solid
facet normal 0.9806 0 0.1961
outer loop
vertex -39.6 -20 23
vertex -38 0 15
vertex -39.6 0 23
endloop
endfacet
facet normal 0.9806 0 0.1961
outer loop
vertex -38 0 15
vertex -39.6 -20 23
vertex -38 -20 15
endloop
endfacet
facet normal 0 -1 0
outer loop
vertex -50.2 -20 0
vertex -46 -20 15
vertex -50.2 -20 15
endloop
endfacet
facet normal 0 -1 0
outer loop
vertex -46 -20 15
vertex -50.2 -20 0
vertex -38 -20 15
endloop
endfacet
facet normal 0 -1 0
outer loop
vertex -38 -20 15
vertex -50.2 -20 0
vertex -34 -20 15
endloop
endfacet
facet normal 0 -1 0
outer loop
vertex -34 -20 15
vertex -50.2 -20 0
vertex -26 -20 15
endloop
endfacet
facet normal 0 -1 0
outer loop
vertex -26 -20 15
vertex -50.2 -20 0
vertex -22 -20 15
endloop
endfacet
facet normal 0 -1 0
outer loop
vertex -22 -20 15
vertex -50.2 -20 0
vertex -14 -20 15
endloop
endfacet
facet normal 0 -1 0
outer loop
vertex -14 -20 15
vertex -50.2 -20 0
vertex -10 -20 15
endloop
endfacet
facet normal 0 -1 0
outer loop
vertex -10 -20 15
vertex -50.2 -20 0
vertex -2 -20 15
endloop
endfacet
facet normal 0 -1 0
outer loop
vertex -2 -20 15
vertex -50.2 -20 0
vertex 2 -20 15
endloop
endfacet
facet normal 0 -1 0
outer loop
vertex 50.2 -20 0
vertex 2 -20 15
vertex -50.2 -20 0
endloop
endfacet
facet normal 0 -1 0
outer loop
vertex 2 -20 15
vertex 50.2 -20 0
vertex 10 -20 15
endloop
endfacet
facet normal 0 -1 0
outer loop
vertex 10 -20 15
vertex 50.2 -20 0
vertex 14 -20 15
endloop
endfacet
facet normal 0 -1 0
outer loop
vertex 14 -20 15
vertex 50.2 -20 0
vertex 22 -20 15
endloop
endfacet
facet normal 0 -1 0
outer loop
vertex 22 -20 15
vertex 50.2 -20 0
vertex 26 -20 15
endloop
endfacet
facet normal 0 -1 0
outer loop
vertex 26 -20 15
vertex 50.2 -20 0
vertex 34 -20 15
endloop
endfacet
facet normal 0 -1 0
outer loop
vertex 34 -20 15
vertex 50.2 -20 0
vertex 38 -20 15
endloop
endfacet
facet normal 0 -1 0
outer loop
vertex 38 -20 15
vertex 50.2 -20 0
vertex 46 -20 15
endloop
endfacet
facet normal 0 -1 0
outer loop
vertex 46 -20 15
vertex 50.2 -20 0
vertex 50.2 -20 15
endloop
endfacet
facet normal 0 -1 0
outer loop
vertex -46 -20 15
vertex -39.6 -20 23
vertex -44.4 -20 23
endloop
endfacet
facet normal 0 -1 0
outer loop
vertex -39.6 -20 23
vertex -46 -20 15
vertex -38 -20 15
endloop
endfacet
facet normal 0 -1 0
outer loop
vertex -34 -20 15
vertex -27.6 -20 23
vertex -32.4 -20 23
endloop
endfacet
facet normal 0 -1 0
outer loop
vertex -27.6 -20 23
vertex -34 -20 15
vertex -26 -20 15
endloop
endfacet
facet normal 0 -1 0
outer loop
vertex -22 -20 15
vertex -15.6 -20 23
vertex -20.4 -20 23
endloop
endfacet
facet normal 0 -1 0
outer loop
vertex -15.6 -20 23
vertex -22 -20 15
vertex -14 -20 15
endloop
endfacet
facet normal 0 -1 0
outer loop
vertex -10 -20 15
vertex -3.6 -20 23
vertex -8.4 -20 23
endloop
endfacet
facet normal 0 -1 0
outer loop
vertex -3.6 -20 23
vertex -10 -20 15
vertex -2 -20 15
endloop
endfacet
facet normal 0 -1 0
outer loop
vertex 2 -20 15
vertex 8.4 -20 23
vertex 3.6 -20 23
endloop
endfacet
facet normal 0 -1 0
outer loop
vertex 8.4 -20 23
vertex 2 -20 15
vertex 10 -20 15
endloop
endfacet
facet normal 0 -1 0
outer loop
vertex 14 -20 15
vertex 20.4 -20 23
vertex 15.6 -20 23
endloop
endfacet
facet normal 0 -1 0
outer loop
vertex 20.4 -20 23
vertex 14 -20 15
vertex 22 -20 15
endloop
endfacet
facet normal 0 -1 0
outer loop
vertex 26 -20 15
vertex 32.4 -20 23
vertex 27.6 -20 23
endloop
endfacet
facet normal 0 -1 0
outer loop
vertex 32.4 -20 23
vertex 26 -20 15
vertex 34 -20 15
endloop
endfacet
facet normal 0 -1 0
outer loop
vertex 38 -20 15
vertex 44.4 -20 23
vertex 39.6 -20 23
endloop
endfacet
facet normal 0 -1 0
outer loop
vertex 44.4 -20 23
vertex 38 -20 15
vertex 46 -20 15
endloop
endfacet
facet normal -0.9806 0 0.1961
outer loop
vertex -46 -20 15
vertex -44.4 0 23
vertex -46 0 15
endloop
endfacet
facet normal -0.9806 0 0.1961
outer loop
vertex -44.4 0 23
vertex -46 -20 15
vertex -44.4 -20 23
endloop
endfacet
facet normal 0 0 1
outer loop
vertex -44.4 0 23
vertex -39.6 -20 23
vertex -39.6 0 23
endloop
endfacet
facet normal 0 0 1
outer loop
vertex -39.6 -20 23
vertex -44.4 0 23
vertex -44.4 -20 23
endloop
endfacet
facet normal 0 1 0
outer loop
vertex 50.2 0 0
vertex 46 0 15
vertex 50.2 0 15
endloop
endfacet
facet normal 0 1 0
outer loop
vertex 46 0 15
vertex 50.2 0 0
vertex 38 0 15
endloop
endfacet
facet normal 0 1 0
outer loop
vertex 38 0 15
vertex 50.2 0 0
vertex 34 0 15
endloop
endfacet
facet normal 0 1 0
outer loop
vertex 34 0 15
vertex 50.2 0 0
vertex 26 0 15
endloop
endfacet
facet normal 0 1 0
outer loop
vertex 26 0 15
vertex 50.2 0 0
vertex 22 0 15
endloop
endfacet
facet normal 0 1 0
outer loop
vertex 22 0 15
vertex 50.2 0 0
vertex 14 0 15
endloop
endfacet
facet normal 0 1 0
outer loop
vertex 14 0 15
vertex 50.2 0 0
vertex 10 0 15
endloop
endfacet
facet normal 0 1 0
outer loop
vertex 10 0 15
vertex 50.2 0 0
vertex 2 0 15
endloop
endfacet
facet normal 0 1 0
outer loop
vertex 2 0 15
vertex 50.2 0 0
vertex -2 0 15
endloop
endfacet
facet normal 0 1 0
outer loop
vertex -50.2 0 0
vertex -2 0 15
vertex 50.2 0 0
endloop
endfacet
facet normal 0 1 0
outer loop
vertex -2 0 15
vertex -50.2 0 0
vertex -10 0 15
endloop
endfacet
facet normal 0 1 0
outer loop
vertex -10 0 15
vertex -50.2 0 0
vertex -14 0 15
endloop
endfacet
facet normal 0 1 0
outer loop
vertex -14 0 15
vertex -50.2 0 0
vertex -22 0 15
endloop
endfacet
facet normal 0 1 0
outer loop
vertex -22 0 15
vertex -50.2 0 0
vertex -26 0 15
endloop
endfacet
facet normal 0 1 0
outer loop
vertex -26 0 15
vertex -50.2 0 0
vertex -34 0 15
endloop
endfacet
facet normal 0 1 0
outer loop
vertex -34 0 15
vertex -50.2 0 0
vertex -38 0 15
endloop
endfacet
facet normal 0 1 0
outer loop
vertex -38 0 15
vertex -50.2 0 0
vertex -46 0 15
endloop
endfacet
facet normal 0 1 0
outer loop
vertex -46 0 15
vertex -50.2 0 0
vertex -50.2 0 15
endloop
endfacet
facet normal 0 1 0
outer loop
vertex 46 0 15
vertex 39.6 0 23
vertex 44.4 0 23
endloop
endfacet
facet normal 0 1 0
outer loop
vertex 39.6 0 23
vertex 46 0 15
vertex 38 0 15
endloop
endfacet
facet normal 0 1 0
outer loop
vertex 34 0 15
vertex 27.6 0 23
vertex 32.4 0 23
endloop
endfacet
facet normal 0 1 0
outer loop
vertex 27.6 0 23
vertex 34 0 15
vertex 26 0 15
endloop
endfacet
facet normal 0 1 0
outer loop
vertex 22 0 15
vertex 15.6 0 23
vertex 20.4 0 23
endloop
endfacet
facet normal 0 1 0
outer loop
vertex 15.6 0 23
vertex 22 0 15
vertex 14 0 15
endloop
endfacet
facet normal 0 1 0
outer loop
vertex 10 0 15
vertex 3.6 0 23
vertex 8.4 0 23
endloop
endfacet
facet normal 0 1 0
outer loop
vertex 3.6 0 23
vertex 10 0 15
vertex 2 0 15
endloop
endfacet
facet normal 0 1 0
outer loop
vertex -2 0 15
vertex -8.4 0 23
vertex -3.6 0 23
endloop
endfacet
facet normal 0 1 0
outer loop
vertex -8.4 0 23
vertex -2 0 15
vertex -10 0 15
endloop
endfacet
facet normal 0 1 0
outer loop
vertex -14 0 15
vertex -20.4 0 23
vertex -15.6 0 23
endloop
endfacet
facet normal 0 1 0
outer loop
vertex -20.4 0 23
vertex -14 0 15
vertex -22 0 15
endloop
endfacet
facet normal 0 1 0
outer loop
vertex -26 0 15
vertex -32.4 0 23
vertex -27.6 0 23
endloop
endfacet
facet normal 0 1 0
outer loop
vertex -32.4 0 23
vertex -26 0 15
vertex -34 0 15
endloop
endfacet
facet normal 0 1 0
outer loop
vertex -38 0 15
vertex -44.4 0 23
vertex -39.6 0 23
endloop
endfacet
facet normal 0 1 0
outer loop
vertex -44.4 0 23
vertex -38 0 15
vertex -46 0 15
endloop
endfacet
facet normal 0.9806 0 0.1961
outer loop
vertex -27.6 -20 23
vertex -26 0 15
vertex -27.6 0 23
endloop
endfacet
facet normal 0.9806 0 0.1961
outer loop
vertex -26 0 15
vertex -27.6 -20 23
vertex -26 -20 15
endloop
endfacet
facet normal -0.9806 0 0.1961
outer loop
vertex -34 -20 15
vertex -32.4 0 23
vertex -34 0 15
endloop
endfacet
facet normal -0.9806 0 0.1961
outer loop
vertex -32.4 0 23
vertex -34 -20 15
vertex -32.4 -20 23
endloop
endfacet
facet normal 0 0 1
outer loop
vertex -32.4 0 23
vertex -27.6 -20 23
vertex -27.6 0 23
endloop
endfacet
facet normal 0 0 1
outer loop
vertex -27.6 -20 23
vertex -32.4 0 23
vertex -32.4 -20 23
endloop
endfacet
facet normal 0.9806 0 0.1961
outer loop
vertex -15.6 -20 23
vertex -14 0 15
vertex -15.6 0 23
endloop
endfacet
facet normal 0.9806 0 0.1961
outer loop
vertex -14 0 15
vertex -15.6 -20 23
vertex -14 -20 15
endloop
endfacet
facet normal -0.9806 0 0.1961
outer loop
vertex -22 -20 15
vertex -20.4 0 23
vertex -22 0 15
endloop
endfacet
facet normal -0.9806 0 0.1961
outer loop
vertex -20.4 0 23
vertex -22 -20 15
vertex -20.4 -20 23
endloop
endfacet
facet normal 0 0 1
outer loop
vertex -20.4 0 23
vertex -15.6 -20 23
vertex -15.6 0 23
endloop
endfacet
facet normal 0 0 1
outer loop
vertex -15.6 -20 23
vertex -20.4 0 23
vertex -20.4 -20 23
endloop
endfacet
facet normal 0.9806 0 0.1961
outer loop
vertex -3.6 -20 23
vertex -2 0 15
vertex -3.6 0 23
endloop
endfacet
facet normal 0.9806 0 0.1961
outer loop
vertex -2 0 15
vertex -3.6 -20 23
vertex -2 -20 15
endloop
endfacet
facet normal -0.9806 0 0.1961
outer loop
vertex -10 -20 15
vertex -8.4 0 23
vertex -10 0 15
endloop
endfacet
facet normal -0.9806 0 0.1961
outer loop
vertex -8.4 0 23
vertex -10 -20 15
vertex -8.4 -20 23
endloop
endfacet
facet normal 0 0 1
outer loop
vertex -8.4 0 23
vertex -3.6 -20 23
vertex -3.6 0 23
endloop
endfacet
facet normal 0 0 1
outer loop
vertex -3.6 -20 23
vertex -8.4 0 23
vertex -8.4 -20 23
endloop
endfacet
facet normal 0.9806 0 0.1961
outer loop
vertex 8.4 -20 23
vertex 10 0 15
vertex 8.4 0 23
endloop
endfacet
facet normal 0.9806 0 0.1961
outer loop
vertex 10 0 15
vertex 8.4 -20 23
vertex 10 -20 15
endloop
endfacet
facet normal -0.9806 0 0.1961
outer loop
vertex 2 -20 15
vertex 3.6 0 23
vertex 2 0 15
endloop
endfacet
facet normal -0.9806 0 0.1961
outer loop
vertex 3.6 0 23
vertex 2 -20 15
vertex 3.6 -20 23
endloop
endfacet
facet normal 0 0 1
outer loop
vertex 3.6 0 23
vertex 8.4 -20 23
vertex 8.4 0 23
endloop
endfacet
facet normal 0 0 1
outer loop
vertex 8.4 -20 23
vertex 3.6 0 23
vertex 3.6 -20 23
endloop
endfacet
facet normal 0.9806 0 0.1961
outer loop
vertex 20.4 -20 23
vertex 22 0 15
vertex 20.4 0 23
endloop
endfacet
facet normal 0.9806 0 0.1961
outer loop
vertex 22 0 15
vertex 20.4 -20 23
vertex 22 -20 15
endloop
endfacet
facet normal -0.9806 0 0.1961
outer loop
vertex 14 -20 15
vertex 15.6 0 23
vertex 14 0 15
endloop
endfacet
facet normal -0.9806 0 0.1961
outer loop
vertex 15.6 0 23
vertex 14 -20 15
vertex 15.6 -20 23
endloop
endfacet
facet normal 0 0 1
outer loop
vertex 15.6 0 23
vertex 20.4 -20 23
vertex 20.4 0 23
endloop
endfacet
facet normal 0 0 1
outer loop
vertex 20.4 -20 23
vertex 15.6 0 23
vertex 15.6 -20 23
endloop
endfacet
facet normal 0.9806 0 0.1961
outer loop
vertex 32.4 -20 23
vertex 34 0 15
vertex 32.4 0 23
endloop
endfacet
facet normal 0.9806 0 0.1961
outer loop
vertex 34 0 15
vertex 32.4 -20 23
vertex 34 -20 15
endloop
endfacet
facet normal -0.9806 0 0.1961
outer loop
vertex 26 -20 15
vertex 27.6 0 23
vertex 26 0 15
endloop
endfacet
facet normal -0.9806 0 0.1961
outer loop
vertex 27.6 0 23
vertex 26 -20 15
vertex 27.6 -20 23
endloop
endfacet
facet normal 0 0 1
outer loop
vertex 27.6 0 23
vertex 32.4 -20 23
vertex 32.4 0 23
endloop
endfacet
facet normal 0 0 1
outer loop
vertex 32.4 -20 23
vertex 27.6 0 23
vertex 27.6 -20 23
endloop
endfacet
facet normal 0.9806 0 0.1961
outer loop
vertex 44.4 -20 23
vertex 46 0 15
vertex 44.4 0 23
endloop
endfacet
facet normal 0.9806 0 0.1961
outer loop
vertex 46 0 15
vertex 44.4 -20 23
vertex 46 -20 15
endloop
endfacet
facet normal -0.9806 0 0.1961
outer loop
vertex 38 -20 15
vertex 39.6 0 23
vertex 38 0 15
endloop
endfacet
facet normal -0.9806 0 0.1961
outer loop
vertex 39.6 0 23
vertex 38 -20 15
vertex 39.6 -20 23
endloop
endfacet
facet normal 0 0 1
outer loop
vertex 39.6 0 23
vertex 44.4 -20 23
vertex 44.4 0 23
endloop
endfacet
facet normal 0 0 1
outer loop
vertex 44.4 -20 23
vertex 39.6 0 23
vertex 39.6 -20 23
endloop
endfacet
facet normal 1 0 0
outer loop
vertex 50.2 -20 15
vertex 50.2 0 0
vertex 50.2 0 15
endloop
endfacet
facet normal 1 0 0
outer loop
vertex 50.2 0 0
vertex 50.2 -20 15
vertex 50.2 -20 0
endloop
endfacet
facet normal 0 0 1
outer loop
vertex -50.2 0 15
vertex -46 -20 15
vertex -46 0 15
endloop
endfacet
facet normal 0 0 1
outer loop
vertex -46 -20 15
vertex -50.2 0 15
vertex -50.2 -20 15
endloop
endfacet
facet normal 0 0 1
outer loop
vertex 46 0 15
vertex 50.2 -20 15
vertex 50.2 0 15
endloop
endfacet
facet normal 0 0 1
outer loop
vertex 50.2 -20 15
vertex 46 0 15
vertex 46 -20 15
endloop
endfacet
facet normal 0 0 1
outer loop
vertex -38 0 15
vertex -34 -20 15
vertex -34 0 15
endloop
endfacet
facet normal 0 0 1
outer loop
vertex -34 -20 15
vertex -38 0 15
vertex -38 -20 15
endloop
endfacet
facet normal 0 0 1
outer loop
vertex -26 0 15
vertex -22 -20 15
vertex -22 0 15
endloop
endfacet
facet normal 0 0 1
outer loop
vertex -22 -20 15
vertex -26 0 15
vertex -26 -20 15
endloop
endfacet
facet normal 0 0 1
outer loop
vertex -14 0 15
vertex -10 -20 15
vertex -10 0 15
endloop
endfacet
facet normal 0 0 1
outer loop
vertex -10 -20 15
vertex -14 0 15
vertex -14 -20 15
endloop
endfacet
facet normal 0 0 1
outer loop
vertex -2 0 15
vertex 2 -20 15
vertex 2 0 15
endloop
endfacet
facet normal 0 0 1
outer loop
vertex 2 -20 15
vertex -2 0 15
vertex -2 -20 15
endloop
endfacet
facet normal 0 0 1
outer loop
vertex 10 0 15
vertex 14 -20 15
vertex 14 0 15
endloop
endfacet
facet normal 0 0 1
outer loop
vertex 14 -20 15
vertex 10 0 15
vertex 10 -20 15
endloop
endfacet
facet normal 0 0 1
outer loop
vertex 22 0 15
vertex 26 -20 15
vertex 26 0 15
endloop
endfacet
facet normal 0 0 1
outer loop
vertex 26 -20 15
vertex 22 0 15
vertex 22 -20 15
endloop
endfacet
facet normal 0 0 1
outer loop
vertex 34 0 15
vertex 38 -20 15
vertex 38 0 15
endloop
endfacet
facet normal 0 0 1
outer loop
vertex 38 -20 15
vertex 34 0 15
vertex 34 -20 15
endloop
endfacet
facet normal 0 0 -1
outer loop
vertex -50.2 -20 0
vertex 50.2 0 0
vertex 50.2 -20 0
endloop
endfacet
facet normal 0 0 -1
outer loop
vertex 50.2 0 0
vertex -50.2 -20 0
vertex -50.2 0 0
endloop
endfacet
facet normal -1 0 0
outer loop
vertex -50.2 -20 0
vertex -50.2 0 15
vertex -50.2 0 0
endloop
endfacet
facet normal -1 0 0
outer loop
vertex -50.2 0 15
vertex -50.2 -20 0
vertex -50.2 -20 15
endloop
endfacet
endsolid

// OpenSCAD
$fn = 32;

// ----------------------------------------------------------------------
// Toothed rack, 8 teeth
// 12 mm pitch, 8 mm teeth
// ----------------------------------------------------------------------

// --- parameters (mm) ---
bar_w = 20;     // bar width (Y)
bar_h = 15;     // bar height (Z)
teeth = 8;      // number of teeth
pitch = 12;     // tooth pitch
tooth_h = 8;    // tooth height above the bar
root_w = 8.4;   // tooth width at the root
crest_w = 4.8;  // tooth width at the crest

// --- derived feature positions (mm) ---
span = (teeth - 1) * pitch;  // = 84   distance between the outer teeth
bar_l = span + root_w + 8;   // = 100.4   bar length: teeth plus 4 mm at each end
tooth_x = -span / 2;         // = -42   X of the first tooth
height = bar_h + tooth_h;    // = 23   overall height
feature_centers = [
  [tooth_x + 0 * pitch, -bar_w / 2],
  [tooth_x + 1 * pitch, -bar_w / 2],
  [tooth_x + 2 * pitch, -bar_w / 2],
  [tooth_x + 3 * pitch, -bar_w / 2],
  [tooth_x + 4 * pitch, -bar_w / 2],
  [tooth_x + 5 * pitch, -bar_w / 2],
  [tooth_x + 6 * pitch, -bar_w / 2],
  [tooth_x + 7 * pitch, -bar_w / 2]
];   // tooth centre line, drives the tooth loop

// bar with a rack of teeth, one extruded trapezoium per centre
module rack_tooth() {
  linear_extrude(height = bar_w)
    polygon(points = [
      [0, 0],
      [root_w, 0],
      [root_w / 2 + crest_w / 2, tooth_h + 1],
      [root_w / 2 - crest_w / 2, tooth_h + 1]
    ]);
}

union() {
  translate([-bar_l / 2, -bar_w, 0]) cube([bar_l, bar_w, bar_h]);
  for (centre = feature_centers)
    translate([centre[0] - root_w / 2, 0, bar_h - 1]) rotate([90, 0, 0]) rack_tooth();
}
